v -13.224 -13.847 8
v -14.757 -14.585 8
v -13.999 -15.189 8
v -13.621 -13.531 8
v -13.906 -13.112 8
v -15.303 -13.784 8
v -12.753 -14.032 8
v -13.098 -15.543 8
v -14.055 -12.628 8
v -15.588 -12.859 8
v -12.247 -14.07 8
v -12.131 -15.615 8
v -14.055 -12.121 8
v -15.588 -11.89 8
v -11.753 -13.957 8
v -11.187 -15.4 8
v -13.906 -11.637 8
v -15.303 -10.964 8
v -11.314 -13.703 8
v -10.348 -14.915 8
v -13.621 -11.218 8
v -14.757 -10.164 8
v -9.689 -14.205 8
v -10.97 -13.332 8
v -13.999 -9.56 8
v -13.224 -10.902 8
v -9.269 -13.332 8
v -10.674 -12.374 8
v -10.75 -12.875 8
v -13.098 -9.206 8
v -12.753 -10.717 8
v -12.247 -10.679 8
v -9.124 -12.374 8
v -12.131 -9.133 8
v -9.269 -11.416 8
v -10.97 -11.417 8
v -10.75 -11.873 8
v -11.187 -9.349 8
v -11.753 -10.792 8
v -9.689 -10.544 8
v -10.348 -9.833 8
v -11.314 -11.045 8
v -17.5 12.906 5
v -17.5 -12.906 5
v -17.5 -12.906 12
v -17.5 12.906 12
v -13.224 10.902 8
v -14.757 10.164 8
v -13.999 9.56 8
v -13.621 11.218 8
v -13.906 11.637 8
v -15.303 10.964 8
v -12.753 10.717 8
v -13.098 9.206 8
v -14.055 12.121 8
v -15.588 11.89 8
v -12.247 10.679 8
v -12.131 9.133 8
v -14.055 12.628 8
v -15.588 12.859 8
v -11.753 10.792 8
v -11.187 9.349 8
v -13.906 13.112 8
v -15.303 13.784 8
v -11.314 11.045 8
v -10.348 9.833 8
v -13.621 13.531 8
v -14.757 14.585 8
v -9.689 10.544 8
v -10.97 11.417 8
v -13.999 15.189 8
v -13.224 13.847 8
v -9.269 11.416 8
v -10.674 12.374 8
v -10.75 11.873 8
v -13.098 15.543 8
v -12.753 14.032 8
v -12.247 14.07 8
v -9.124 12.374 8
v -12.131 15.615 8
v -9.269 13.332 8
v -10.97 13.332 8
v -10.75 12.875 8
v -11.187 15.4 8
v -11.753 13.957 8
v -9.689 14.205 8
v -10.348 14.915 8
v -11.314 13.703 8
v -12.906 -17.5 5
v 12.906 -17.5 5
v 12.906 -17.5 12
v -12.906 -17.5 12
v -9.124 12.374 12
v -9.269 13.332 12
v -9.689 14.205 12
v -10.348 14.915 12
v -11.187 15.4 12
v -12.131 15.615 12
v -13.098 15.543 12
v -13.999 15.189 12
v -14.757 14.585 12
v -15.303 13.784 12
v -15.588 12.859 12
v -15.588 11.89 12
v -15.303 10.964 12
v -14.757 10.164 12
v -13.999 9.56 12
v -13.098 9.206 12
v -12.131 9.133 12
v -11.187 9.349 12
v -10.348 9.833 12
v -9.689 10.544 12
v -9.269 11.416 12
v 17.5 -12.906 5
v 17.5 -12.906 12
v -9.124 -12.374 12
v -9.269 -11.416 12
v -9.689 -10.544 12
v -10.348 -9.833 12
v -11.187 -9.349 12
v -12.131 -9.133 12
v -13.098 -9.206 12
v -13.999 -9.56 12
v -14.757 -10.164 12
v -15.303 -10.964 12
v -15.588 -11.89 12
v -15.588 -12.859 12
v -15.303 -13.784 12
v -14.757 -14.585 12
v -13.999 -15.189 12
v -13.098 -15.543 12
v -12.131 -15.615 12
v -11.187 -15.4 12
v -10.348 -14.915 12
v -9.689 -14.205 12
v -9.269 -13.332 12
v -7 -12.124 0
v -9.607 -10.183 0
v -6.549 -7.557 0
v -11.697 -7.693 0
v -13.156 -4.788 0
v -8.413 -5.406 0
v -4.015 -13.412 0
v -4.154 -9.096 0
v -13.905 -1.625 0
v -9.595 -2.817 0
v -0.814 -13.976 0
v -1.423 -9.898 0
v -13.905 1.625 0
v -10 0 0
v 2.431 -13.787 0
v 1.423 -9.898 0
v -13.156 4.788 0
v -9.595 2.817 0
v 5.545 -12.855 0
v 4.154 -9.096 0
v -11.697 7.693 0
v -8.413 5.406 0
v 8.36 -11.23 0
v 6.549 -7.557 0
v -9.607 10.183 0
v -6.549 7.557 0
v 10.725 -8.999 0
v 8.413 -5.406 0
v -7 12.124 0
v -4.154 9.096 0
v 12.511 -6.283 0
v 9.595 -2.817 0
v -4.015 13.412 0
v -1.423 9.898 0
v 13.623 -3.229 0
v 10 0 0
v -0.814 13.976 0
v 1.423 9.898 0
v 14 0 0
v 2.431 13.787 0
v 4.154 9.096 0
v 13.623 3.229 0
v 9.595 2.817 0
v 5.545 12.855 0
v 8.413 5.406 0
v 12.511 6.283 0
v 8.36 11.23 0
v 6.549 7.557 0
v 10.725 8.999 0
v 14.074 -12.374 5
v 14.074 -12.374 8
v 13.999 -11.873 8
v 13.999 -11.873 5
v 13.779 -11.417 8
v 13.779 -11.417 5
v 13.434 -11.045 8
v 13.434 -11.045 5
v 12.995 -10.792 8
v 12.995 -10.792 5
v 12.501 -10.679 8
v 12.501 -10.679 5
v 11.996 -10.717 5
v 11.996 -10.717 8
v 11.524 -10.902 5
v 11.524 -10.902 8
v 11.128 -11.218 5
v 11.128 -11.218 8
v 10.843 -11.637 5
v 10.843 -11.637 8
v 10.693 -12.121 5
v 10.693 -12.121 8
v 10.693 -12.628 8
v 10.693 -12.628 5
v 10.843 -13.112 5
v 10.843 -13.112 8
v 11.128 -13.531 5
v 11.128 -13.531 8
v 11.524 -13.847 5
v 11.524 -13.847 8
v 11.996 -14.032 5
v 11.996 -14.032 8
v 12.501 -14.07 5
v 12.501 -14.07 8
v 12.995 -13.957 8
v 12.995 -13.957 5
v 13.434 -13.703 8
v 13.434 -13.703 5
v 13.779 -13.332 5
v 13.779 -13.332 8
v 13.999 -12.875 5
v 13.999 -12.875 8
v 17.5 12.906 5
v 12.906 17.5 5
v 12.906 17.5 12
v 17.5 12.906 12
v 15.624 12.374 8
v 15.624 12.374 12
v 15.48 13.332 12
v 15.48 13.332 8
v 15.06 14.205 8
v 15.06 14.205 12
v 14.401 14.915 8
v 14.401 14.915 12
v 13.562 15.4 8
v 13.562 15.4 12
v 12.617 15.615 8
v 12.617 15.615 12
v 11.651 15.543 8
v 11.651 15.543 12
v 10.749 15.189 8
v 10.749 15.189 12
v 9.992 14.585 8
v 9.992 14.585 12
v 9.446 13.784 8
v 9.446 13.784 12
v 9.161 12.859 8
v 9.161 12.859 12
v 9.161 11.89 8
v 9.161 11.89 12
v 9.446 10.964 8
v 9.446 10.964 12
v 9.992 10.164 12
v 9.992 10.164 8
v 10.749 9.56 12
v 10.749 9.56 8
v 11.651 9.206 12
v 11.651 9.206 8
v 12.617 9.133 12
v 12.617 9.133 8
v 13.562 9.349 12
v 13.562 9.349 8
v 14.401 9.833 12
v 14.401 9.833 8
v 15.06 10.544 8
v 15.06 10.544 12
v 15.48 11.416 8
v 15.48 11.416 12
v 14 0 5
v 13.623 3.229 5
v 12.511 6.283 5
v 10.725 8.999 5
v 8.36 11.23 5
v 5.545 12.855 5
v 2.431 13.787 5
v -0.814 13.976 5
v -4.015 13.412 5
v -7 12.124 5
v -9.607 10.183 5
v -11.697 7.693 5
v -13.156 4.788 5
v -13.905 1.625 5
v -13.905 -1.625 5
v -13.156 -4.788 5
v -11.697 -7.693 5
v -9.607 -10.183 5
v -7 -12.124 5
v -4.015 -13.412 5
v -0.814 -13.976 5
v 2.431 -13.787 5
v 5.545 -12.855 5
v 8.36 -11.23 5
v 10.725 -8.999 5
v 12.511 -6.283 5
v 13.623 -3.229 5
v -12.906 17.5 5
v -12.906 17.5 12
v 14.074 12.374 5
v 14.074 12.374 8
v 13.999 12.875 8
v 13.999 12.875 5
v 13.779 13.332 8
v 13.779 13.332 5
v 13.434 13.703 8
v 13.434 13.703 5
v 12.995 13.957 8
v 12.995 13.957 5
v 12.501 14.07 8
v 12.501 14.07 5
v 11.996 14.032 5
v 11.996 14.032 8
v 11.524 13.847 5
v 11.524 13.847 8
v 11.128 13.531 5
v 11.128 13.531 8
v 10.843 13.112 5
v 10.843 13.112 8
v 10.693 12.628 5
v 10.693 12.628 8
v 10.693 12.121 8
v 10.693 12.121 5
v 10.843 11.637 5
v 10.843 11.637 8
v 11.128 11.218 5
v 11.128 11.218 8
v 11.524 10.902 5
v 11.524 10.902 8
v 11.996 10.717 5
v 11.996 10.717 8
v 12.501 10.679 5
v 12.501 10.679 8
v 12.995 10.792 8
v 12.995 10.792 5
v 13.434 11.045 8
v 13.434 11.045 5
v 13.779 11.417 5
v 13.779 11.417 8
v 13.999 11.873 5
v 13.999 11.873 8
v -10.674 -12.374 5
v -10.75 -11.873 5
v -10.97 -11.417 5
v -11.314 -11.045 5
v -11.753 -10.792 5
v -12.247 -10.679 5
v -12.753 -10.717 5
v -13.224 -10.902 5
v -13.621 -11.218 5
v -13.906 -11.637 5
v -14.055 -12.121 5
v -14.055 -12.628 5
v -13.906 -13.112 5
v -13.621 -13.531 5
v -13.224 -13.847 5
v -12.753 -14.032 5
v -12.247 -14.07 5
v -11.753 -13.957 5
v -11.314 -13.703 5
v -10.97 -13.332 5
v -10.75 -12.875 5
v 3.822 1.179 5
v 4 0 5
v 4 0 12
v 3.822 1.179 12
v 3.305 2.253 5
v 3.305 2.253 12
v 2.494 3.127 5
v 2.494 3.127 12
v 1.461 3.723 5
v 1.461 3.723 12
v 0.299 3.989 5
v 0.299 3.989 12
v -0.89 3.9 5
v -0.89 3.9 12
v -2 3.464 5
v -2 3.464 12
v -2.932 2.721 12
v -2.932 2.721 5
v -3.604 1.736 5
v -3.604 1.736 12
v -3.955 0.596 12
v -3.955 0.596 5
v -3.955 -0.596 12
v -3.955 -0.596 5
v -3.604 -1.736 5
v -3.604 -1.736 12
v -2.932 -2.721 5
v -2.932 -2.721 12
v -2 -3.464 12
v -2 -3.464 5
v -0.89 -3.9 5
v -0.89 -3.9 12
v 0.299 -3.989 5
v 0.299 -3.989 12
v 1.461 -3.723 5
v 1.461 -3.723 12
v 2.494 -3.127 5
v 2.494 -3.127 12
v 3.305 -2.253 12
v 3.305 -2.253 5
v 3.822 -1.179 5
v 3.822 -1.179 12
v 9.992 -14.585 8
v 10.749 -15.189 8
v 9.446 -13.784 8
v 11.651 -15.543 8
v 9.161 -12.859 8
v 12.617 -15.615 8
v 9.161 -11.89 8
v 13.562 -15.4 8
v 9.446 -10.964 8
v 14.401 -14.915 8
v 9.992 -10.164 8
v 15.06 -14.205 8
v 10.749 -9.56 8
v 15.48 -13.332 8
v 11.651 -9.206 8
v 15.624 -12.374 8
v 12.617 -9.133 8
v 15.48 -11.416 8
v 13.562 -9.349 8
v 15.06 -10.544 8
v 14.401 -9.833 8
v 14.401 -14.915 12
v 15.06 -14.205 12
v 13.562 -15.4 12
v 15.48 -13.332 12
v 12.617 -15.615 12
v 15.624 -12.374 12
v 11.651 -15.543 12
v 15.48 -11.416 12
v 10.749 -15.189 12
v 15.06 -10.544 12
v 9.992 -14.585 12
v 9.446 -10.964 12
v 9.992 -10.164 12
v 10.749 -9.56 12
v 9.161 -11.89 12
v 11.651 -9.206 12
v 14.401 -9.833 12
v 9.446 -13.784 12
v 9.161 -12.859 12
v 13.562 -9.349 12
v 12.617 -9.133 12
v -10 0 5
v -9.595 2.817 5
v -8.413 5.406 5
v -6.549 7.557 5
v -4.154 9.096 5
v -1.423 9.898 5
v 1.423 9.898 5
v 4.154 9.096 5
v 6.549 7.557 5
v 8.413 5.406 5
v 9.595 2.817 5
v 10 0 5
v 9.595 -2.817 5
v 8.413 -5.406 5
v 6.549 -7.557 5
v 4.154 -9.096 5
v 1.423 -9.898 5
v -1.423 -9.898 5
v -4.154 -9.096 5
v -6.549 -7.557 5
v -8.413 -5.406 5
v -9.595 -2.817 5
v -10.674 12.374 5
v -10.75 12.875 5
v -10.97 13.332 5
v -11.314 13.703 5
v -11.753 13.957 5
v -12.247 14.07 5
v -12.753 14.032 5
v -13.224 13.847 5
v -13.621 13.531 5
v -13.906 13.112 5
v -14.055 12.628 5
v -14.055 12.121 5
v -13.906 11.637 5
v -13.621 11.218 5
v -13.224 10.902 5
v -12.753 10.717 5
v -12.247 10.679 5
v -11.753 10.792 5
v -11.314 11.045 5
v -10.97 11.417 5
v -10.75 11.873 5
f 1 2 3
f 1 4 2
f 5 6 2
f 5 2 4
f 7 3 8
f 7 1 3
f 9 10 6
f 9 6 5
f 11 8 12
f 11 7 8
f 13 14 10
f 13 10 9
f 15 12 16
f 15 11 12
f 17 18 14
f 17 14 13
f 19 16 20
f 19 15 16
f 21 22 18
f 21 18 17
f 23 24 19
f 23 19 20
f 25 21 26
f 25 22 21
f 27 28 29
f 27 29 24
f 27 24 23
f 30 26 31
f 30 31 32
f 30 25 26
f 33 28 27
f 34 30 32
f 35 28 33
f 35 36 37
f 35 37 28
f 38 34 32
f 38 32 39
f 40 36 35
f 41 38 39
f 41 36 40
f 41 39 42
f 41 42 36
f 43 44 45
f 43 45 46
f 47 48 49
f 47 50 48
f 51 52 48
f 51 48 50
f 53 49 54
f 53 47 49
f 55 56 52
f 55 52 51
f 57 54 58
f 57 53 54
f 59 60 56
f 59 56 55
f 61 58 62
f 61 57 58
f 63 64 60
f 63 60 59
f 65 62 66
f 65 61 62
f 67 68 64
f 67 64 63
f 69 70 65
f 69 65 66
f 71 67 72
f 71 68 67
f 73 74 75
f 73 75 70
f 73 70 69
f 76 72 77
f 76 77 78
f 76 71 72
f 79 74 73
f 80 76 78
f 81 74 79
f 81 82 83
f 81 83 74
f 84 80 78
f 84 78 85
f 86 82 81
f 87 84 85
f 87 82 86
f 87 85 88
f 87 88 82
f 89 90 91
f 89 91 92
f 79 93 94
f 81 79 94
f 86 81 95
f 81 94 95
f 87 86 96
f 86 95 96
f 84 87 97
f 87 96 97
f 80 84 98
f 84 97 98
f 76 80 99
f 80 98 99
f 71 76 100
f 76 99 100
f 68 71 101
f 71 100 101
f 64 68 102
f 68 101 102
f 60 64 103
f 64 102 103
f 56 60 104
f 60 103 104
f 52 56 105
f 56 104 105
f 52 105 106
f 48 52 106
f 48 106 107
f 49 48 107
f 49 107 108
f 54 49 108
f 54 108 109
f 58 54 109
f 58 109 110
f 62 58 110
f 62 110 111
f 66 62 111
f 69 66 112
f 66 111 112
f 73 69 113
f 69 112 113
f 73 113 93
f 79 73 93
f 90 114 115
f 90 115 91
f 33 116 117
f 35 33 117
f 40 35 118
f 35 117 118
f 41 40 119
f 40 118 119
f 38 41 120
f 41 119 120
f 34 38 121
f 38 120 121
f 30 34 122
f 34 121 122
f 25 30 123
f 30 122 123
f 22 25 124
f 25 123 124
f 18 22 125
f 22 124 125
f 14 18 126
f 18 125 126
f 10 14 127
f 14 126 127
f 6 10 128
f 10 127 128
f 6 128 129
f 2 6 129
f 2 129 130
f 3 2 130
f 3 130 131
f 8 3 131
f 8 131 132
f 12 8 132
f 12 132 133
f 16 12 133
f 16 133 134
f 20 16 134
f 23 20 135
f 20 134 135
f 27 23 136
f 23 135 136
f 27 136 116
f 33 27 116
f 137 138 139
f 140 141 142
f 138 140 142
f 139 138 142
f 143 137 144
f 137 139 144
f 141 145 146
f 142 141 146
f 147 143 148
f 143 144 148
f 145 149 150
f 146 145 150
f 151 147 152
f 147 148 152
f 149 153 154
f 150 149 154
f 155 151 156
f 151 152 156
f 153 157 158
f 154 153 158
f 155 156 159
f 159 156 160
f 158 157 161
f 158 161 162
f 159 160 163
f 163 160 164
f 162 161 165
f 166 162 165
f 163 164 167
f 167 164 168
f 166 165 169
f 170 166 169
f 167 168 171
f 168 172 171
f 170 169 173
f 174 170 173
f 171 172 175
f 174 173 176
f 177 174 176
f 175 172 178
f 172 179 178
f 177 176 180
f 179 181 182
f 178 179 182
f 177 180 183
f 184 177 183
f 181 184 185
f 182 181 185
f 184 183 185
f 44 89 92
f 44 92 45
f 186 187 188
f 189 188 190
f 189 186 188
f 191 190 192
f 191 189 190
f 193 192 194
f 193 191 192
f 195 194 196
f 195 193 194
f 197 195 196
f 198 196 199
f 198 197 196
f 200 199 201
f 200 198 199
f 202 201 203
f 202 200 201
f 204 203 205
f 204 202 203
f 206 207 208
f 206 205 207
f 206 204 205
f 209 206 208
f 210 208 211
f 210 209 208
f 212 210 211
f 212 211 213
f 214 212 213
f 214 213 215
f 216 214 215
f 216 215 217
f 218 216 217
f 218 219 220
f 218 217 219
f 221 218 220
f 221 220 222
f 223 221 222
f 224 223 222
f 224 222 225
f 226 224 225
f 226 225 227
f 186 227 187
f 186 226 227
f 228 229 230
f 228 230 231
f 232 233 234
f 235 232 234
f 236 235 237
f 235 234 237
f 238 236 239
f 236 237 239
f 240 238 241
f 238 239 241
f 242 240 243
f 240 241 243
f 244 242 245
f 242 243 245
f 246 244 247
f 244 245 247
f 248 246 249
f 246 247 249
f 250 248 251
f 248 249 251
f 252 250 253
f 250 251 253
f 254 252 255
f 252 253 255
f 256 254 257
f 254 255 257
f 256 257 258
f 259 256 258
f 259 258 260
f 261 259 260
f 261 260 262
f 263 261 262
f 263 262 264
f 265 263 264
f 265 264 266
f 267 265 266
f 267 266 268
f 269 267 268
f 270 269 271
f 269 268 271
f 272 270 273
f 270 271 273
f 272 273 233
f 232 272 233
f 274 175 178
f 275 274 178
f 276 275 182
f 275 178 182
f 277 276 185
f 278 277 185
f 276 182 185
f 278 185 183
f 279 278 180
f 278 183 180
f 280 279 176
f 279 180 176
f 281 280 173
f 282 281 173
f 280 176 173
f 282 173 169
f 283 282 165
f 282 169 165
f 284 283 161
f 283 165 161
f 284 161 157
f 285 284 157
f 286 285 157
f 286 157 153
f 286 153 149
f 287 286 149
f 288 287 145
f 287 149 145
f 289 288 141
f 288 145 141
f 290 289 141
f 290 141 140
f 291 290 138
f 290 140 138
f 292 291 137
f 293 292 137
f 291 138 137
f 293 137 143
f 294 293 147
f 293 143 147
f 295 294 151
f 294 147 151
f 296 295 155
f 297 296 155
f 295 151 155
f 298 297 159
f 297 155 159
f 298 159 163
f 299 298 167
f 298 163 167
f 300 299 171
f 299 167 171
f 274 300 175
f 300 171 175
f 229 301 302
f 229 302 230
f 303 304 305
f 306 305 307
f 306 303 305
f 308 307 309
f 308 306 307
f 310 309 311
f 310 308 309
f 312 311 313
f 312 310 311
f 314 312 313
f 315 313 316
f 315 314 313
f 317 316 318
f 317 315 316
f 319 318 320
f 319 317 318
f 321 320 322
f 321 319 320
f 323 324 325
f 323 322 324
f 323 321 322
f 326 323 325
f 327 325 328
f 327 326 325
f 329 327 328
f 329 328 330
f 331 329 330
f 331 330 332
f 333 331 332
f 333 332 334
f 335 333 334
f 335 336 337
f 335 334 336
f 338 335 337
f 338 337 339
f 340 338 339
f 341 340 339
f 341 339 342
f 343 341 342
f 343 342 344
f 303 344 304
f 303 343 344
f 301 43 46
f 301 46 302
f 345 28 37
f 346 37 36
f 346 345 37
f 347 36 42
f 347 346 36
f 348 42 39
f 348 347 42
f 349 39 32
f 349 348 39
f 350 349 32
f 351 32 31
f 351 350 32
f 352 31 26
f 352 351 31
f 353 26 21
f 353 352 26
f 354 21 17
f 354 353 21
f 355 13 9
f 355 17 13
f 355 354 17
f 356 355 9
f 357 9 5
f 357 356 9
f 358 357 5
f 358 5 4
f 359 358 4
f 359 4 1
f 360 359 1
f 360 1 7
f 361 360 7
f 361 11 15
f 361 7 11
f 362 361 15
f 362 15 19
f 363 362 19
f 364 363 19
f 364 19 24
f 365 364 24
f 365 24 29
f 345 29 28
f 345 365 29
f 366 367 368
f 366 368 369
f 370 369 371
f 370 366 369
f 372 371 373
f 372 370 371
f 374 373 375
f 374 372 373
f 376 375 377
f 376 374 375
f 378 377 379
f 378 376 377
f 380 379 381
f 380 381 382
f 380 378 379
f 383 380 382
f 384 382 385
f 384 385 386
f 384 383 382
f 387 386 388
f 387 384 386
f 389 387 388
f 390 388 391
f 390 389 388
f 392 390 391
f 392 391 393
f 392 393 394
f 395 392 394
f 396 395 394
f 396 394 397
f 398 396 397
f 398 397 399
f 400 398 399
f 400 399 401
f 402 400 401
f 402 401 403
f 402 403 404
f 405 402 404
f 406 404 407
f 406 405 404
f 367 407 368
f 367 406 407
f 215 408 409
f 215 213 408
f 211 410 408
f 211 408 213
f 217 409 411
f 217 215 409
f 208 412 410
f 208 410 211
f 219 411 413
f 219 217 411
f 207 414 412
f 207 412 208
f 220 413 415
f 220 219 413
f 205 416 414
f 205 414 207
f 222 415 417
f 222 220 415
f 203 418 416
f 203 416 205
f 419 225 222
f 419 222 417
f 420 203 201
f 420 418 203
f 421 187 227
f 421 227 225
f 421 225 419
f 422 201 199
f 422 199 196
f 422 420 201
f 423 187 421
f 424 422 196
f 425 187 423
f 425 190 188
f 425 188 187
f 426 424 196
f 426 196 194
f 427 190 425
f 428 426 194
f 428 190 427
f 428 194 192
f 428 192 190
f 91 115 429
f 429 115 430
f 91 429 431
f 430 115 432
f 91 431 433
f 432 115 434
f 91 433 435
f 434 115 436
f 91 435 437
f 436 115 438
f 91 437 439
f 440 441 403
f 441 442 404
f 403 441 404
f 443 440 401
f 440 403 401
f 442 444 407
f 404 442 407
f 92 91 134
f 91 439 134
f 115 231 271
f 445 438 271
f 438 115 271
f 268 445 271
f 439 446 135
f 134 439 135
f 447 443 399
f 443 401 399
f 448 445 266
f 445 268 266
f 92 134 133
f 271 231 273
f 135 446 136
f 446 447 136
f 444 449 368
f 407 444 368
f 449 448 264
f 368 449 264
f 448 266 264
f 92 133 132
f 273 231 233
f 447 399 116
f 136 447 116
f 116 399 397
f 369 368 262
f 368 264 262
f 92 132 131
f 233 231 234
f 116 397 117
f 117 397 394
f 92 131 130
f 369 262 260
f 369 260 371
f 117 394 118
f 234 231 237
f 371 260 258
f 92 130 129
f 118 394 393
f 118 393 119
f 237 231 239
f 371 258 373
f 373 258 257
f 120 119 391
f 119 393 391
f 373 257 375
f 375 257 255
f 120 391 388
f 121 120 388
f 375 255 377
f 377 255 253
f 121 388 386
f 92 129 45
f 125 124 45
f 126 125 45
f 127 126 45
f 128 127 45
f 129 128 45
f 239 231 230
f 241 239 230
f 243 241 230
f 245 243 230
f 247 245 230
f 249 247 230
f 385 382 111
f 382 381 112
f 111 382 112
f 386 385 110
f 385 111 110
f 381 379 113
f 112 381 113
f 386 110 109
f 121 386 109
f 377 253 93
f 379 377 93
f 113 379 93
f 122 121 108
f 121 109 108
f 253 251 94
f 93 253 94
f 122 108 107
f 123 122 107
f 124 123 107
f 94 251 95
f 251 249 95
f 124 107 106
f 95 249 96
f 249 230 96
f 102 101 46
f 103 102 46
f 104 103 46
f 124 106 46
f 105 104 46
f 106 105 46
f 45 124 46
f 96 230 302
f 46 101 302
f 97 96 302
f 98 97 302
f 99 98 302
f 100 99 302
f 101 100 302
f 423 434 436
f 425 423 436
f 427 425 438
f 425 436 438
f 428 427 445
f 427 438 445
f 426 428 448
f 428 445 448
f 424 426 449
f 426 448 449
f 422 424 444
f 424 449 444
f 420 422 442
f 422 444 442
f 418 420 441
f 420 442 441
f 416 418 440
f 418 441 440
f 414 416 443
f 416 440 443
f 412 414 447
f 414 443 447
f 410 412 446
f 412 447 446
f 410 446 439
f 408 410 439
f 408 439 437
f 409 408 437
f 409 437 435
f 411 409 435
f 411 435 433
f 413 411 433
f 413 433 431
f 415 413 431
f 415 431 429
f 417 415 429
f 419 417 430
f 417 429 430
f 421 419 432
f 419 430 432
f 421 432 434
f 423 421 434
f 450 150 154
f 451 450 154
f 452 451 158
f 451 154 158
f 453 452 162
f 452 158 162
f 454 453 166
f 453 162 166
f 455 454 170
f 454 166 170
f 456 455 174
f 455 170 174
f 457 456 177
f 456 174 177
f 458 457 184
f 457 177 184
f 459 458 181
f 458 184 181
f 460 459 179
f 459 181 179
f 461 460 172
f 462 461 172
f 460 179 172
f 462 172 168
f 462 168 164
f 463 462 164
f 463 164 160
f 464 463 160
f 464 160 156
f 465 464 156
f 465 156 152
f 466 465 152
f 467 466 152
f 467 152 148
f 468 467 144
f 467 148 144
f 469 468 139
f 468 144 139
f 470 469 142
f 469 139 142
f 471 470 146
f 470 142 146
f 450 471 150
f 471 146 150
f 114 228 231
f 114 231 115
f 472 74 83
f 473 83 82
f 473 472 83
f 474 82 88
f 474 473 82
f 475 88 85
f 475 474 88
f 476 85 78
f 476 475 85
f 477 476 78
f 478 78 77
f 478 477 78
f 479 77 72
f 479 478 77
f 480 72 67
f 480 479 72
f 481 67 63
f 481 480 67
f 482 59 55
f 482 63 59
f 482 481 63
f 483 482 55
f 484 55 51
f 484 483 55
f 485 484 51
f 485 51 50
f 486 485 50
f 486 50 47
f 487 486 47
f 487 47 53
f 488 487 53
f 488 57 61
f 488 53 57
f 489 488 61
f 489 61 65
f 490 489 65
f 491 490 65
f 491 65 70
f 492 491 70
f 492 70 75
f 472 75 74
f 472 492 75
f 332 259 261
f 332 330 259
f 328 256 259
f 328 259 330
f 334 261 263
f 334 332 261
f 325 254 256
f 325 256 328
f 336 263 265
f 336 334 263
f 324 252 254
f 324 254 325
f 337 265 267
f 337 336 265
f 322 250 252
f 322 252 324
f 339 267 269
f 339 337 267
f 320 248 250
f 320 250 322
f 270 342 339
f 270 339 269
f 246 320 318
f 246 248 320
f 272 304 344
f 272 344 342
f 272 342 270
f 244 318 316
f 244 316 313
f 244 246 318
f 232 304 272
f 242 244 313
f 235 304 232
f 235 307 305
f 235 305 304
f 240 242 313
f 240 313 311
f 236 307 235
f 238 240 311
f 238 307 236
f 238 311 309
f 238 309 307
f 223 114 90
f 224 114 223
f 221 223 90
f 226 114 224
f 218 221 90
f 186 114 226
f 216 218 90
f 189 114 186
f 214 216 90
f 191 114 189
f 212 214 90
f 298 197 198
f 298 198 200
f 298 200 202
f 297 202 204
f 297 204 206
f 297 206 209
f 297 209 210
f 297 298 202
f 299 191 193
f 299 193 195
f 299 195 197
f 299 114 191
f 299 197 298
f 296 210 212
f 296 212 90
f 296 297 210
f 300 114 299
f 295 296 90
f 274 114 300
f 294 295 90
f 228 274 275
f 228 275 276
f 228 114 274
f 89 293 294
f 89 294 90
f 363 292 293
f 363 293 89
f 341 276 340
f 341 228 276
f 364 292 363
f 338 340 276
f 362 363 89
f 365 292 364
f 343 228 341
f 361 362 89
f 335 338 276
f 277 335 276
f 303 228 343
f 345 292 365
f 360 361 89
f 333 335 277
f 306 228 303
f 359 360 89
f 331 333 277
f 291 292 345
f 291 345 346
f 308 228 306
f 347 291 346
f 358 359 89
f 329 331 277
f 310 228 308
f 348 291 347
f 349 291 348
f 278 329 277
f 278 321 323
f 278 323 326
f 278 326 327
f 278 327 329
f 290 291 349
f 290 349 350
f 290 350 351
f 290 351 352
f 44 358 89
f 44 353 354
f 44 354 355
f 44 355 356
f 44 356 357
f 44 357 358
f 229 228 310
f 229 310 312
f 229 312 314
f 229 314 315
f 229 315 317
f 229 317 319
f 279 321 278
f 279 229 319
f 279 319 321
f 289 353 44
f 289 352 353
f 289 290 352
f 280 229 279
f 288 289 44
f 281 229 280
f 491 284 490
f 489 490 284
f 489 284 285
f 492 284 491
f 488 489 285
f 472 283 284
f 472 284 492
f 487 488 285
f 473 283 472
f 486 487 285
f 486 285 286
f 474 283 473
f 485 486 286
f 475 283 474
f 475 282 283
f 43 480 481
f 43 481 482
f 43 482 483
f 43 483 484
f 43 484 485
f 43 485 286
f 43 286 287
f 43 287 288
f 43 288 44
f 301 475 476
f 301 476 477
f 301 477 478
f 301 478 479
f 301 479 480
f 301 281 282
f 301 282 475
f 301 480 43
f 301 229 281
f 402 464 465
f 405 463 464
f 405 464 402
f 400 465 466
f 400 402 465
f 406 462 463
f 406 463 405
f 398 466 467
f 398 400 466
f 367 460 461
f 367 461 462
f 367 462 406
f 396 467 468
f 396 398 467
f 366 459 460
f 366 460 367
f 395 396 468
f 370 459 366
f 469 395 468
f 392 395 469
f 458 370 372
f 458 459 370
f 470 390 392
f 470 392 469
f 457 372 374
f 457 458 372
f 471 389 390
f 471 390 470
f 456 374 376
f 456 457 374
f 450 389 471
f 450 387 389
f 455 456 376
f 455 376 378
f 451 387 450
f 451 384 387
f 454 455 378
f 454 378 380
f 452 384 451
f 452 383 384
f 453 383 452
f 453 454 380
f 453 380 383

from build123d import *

# Parameters (mm, degrees)
SKETCH_1_R          = 14
SKETCH_1_R_2        = 4
EXTRUDE_1_DEPTH     = 5
SKETCH_2_R          = 4
SKETCH_2_R_2        = 1.7
EXTRUDE_2_DEPTH     = 7
SKETCH_3_R          = 3.25
CUT_EXTRUDE_1_DEPTH = 4
SKETCH_4_R          = 10
CUT_EXTRUDE_2_DEPTH = 5


with BuildPart() as part:
    # 草图1 → 凸台-拉伸1 (new body)
    with BuildSketch(Plane.XY):
        Circle(SKETCH_1_R)
        Circle(SKETCH_1_R_2, mode=Mode.SUBTRACT)
    extrude(amount=EXTRUDE_1_DEPTH)

    # 草图2 → 凸台-拉伸2 (add)
    with BuildSketch(Plane.XY.offset(5)):
        Polygon((-17.5, 12.905591591), (-12.905591591, 17.5), (12.905591591, 17.5), (17.5, 12.905591591), (17.5, -12.905591591), (12.905591591, -17.5), (-12.905591591, -17.5), (-17.5, -12.905591591), align=None)
        Circle(SKETCH_2_R, mode=Mode.SUBTRACT)
        with Locations((-12.374368671, 12.374368671)):
            Circle(SKETCH_2_R_2, mode=Mode.SUBTRACT)
        with Locations((12.374368671, 12.374368671)):
            Circle(SKETCH_2_R_2, mode=Mode.SUBTRACT)
        with Locations((12.374368671, -12.374368671)):
            Circle(SKETCH_2_R_2, mode=Mode.SUBTRACT)
        with Locations((-12.374368671, -12.374368671)):
            Circle(SKETCH_2_R_2, mode=Mode.SUBTRACT)
    extrude(amount=EXTRUDE_2_DEPTH)

    # 草图3 → 切除-拉伸1 (cut)
    with BuildSketch(Plane.XY.offset(12)):
        with Locations((-12.374368671, 12.374368671)):
            Circle(SKETCH_3_R)
        with Locations((12.374368671, 12.374368671)):
            Circle(SKETCH_3_R)
        with Locations((12.374368671, -12.374368671)):
            Circle(SKETCH_3_R)
        with Locations((-12.374368671, -12.374368671)):
            Circle(SKETCH_3_R)
    extrude(amount=-CUT_EXTRUDE_1_DEPTH, mode=Mode.SUBTRACT)

    # 草图4 → 切除-拉伸2 (cut)
    with BuildSketch(Plane(origin=(0, 0, 0), x_dir=(-1, 0, 0), z_dir=(0, 0, -1))):
        Circle(SKETCH_4_R)
    extrude(amount=-CUT_EXTRUDE_2_DEPTH, mode=Mode.SUBTRACT)


solid = part.part
